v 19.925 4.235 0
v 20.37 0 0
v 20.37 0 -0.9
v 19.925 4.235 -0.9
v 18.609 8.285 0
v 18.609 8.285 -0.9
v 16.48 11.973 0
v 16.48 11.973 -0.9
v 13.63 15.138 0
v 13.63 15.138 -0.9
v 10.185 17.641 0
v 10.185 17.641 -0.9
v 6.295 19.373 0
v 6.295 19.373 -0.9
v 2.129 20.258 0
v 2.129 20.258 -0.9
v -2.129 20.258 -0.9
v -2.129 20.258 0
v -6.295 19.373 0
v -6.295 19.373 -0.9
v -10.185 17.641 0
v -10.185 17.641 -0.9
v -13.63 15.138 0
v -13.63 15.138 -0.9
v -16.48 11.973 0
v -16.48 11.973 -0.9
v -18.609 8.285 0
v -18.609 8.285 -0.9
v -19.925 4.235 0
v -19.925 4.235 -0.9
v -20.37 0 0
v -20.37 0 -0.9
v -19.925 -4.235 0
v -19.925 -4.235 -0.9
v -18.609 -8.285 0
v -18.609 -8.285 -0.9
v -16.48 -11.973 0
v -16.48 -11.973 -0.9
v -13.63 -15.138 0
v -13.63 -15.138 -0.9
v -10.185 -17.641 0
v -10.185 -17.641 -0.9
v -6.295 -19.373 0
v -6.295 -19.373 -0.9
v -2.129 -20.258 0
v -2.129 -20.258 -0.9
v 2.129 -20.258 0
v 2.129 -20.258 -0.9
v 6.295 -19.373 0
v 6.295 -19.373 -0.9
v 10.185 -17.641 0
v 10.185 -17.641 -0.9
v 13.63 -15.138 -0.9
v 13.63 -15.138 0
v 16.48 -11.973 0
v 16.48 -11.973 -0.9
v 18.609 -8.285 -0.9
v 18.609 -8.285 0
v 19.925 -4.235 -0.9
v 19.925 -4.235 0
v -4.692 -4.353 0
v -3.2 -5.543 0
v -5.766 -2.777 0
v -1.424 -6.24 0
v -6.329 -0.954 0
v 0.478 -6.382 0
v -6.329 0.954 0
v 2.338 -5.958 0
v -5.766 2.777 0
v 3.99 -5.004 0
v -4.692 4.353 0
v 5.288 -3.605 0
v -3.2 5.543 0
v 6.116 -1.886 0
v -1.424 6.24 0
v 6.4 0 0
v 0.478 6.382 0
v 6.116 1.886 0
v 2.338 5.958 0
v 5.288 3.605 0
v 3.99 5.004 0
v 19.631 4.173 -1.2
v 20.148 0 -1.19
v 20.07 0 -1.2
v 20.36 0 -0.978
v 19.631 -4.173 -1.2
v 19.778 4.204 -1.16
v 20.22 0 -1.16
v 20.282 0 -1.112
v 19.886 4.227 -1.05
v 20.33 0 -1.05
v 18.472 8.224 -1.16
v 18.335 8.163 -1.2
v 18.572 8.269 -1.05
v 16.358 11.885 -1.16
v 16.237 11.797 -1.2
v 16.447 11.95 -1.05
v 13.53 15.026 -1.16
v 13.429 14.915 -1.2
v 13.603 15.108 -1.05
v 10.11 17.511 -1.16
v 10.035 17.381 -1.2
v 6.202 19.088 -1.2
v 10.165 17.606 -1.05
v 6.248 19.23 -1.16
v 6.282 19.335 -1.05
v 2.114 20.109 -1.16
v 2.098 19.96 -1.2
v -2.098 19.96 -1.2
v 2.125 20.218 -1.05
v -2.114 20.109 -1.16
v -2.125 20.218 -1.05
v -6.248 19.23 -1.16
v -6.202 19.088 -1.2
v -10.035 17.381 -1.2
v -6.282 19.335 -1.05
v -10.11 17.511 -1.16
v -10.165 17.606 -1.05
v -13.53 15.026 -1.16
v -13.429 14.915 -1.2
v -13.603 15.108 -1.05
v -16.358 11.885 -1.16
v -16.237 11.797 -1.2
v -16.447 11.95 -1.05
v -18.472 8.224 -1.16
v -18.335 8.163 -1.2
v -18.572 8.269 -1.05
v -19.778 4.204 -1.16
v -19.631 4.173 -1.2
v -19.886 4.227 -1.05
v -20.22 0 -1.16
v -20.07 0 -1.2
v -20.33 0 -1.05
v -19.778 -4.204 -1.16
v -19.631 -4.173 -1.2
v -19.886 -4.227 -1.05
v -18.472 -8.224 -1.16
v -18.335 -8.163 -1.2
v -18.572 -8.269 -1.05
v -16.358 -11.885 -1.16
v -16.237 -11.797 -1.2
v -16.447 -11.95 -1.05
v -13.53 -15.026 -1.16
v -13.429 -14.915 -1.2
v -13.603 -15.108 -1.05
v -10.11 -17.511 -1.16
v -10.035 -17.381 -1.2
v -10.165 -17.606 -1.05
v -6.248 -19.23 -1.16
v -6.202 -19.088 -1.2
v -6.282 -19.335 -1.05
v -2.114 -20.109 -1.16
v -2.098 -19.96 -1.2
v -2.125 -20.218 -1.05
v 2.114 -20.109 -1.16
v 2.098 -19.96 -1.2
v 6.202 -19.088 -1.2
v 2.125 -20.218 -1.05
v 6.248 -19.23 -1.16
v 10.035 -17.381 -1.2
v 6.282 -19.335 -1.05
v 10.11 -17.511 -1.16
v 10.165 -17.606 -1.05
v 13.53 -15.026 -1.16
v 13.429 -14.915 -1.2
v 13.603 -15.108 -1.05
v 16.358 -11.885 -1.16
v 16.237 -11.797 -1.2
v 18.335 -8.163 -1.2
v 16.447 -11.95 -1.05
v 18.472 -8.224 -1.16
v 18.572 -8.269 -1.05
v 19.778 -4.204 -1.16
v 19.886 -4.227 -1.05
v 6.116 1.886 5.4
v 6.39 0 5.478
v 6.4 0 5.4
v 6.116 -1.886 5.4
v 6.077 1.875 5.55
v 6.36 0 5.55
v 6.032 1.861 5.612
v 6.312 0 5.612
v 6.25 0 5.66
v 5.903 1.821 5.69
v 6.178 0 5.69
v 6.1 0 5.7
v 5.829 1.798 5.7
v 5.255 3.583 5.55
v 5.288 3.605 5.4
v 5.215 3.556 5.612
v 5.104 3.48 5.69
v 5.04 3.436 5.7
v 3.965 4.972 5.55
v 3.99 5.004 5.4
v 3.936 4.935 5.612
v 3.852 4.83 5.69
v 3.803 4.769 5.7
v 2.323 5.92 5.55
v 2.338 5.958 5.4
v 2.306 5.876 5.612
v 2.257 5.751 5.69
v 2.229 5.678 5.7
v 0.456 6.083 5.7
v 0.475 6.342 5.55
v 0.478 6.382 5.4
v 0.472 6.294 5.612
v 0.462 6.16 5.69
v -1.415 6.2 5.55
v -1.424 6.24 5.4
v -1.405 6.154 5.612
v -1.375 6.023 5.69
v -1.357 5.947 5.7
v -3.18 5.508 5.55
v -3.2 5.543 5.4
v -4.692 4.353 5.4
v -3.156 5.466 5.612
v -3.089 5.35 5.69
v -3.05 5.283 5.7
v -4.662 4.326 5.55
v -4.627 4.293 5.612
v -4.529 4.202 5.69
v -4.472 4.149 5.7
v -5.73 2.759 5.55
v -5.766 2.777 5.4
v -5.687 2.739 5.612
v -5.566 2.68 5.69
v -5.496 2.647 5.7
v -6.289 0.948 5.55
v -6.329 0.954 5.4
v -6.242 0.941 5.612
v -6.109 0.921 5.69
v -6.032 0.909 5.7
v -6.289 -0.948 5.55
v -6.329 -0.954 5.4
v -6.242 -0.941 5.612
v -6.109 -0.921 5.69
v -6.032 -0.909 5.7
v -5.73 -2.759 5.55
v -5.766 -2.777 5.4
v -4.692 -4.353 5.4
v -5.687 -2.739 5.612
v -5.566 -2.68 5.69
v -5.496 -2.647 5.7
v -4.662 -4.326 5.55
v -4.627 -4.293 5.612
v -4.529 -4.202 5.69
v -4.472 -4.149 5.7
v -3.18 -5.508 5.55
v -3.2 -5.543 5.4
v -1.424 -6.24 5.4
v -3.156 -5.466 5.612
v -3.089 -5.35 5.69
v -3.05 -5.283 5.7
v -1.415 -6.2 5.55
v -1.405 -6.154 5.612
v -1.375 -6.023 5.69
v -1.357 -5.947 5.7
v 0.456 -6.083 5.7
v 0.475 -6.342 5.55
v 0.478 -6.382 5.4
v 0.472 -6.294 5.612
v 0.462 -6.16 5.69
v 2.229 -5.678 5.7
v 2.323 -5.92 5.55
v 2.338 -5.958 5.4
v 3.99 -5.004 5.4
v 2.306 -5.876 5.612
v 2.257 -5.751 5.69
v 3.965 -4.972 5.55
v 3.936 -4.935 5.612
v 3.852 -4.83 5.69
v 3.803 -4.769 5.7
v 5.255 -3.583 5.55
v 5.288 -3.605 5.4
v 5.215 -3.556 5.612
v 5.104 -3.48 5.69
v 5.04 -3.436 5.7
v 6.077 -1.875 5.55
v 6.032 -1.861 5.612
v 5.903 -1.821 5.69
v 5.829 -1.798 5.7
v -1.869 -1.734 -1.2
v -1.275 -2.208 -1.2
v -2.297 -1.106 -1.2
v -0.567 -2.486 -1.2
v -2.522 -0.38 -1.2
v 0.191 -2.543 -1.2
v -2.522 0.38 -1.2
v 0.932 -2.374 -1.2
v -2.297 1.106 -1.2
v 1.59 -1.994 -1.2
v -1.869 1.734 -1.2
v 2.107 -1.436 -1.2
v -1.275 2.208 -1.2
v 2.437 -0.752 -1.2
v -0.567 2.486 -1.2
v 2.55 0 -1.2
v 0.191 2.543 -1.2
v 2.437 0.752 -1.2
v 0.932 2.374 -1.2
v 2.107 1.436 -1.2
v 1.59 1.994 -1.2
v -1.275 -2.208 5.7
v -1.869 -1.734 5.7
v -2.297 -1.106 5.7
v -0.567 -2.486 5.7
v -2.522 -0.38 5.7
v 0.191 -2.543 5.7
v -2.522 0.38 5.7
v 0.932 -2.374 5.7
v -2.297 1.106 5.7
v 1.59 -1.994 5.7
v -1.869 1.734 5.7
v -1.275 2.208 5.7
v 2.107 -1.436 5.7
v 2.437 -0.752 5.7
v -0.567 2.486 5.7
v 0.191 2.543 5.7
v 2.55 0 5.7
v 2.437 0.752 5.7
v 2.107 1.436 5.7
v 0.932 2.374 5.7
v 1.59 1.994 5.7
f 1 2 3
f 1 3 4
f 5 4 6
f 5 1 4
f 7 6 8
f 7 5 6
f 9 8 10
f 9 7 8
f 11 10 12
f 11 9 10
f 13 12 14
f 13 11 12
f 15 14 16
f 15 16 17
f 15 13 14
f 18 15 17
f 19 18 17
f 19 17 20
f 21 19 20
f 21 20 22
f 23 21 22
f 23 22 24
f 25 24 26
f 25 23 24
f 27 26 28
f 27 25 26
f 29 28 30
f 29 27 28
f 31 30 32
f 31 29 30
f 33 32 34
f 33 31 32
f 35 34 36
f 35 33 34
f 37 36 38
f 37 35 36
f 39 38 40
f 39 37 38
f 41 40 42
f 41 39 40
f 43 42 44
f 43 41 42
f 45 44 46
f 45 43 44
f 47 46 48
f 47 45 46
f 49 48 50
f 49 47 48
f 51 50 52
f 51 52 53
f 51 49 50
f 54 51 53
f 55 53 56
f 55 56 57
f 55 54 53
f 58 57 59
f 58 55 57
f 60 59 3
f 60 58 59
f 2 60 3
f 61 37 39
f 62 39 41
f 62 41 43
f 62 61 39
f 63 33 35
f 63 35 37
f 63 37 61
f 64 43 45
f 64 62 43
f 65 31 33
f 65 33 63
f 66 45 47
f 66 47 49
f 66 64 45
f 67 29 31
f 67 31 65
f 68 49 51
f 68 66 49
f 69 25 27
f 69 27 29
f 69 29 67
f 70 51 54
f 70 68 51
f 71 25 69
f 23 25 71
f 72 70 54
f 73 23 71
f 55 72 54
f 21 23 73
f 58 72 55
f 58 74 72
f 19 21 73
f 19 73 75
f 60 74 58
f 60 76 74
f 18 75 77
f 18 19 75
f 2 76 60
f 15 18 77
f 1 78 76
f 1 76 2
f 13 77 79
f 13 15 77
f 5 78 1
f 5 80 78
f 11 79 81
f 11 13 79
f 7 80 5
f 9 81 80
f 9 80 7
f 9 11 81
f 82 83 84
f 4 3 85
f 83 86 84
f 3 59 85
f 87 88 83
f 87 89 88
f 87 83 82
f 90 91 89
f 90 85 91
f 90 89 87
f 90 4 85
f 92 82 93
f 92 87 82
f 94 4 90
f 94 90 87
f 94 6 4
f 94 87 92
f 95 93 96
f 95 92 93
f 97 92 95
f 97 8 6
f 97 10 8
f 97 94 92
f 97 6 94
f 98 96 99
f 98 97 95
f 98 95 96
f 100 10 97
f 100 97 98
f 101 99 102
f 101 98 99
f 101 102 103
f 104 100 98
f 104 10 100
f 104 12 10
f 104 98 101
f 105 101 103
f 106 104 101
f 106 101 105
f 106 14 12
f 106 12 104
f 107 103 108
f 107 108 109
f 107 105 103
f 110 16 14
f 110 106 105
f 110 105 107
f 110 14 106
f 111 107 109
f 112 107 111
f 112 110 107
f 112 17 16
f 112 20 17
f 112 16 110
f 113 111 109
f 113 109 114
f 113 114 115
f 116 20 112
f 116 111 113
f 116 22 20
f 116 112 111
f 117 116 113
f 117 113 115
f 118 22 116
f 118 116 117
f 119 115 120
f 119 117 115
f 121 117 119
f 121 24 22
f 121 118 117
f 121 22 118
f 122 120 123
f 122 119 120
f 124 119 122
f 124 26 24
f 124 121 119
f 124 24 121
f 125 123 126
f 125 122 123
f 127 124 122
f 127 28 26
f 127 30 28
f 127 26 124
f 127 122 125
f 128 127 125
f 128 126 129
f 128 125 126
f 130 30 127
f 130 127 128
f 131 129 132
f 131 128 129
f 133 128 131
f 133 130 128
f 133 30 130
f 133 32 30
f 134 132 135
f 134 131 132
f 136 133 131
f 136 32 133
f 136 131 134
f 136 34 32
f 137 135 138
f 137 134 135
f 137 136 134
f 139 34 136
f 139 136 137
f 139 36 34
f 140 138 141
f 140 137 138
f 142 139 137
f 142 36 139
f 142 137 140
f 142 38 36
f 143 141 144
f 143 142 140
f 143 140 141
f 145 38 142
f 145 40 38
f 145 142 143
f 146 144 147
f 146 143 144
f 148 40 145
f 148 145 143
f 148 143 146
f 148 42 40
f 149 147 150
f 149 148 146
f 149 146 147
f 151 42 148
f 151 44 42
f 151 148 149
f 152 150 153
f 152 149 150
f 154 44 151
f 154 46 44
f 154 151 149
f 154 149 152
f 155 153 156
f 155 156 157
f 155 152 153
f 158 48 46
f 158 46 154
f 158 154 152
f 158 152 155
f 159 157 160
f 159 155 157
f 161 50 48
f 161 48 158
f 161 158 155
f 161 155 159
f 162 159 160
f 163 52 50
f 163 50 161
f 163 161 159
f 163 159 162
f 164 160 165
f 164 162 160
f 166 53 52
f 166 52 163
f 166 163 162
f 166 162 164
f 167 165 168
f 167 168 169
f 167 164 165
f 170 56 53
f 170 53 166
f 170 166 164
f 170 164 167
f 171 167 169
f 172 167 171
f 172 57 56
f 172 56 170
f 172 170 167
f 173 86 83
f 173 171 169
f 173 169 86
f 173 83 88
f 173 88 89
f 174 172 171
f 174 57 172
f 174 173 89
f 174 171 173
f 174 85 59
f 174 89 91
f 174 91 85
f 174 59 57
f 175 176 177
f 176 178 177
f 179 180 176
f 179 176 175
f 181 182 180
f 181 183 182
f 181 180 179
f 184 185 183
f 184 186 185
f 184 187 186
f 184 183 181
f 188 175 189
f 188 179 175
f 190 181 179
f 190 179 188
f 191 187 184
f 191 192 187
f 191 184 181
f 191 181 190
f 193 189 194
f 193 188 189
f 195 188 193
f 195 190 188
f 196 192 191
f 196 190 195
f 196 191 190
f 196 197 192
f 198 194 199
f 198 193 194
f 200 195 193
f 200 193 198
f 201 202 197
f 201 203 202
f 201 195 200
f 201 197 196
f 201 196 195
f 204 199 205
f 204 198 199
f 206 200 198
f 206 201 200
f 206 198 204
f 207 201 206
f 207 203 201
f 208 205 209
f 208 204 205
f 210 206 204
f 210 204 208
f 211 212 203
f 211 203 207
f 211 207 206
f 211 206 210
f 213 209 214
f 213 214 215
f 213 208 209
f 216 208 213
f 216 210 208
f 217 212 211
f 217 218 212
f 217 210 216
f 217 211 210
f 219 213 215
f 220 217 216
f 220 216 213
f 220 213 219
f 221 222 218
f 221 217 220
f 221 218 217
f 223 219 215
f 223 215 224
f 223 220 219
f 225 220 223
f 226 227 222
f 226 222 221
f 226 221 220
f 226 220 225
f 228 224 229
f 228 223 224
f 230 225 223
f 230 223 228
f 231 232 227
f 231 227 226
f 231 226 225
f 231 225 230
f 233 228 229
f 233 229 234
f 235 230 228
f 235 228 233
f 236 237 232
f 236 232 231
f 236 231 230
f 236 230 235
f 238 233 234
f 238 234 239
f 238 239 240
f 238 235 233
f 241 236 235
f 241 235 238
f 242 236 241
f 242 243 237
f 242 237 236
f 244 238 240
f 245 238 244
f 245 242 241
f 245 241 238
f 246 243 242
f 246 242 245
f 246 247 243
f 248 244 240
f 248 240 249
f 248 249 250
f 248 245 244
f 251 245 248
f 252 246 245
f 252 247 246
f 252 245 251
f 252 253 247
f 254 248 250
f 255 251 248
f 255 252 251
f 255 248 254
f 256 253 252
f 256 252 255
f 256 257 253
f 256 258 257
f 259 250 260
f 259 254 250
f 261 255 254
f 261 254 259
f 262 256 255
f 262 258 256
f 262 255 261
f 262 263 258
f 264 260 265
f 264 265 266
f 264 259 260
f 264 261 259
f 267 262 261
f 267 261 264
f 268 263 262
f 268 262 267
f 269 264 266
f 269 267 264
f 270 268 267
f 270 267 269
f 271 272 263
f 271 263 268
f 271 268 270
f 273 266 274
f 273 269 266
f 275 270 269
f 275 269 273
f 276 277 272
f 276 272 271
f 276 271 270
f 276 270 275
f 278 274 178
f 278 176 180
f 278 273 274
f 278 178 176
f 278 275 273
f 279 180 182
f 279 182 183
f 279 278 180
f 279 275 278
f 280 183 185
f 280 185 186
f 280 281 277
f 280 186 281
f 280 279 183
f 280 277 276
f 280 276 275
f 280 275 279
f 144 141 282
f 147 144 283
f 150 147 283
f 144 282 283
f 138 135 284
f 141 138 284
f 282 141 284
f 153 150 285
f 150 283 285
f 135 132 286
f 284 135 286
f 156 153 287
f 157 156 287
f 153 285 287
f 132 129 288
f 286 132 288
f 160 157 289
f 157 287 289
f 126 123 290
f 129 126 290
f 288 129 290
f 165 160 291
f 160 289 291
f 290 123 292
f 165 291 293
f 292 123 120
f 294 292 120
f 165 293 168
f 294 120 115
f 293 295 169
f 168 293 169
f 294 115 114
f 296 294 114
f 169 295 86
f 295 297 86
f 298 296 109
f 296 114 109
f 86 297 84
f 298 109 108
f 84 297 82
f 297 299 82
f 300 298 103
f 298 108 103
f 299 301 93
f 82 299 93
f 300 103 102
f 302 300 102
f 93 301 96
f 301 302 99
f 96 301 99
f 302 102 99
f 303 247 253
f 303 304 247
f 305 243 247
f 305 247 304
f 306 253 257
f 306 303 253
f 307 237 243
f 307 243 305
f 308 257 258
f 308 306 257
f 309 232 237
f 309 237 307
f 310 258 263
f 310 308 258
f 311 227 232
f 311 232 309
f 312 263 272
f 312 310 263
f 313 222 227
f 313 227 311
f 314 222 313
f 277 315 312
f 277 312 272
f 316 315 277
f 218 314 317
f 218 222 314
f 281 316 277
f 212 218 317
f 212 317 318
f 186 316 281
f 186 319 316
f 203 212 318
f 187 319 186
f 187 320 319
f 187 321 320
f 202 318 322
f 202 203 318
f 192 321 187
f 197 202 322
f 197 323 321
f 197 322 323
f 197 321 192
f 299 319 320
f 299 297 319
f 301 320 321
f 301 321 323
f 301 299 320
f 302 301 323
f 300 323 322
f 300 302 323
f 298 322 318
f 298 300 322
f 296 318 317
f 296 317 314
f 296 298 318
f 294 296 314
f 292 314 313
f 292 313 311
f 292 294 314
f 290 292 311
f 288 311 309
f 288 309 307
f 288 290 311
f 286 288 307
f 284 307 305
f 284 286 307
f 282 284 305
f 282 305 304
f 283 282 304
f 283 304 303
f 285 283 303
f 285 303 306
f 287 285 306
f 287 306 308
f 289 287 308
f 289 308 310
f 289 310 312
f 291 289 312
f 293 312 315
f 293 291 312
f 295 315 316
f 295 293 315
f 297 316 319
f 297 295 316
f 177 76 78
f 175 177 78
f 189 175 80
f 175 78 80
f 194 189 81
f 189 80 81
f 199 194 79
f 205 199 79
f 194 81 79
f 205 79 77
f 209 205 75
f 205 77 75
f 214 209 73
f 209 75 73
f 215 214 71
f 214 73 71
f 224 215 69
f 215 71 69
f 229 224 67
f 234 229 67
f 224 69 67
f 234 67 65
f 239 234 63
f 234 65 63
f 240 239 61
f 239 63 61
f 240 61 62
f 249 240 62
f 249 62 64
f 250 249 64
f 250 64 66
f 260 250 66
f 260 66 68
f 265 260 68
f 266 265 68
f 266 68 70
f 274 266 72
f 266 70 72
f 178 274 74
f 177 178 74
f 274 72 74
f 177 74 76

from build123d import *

# Parameters (mm, degrees)
F0_R     = 20.37
F0_R_2   = 6.4
F0_R_3   = 2.55
F1_DEPTH = 1.2
F2_DEPTH = 5.7
F3_R     = 0.3


# Not quite as in the source:
# - a feature names something its author has since deleted; it is built from what else it names


with BuildPart() as f1:
    # F0 (on Top) → F1 (new body)
    with BuildSketch(Plane.XY):
        Circle(F0_R)
        Circle(F0_R_2, mode=Mode.SUBTRACT)
        Circle(F0_R_2)
        Circle(F0_R_3, mode=Mode.SUBTRACT)
    extrude(amount=-F1_DEPTH)

    # F0 (on Top) → F2 (join)
    with BuildSketch(Plane.XY):
        Circle(F0_R_2)
        Circle(F0_R_3, mode=Mode.SUBTRACT)
    extrude(amount=F2_DEPTH)

    # F3
    f3_edges = [f1.edges().sort_by_distance(p)[0] for p in [
        (-20.37, 0, -1.2),
        (-6.4, 0, 5.7),
    ]]
    fillet(f3_edges, radius=F3_R)


solid = f1.part
